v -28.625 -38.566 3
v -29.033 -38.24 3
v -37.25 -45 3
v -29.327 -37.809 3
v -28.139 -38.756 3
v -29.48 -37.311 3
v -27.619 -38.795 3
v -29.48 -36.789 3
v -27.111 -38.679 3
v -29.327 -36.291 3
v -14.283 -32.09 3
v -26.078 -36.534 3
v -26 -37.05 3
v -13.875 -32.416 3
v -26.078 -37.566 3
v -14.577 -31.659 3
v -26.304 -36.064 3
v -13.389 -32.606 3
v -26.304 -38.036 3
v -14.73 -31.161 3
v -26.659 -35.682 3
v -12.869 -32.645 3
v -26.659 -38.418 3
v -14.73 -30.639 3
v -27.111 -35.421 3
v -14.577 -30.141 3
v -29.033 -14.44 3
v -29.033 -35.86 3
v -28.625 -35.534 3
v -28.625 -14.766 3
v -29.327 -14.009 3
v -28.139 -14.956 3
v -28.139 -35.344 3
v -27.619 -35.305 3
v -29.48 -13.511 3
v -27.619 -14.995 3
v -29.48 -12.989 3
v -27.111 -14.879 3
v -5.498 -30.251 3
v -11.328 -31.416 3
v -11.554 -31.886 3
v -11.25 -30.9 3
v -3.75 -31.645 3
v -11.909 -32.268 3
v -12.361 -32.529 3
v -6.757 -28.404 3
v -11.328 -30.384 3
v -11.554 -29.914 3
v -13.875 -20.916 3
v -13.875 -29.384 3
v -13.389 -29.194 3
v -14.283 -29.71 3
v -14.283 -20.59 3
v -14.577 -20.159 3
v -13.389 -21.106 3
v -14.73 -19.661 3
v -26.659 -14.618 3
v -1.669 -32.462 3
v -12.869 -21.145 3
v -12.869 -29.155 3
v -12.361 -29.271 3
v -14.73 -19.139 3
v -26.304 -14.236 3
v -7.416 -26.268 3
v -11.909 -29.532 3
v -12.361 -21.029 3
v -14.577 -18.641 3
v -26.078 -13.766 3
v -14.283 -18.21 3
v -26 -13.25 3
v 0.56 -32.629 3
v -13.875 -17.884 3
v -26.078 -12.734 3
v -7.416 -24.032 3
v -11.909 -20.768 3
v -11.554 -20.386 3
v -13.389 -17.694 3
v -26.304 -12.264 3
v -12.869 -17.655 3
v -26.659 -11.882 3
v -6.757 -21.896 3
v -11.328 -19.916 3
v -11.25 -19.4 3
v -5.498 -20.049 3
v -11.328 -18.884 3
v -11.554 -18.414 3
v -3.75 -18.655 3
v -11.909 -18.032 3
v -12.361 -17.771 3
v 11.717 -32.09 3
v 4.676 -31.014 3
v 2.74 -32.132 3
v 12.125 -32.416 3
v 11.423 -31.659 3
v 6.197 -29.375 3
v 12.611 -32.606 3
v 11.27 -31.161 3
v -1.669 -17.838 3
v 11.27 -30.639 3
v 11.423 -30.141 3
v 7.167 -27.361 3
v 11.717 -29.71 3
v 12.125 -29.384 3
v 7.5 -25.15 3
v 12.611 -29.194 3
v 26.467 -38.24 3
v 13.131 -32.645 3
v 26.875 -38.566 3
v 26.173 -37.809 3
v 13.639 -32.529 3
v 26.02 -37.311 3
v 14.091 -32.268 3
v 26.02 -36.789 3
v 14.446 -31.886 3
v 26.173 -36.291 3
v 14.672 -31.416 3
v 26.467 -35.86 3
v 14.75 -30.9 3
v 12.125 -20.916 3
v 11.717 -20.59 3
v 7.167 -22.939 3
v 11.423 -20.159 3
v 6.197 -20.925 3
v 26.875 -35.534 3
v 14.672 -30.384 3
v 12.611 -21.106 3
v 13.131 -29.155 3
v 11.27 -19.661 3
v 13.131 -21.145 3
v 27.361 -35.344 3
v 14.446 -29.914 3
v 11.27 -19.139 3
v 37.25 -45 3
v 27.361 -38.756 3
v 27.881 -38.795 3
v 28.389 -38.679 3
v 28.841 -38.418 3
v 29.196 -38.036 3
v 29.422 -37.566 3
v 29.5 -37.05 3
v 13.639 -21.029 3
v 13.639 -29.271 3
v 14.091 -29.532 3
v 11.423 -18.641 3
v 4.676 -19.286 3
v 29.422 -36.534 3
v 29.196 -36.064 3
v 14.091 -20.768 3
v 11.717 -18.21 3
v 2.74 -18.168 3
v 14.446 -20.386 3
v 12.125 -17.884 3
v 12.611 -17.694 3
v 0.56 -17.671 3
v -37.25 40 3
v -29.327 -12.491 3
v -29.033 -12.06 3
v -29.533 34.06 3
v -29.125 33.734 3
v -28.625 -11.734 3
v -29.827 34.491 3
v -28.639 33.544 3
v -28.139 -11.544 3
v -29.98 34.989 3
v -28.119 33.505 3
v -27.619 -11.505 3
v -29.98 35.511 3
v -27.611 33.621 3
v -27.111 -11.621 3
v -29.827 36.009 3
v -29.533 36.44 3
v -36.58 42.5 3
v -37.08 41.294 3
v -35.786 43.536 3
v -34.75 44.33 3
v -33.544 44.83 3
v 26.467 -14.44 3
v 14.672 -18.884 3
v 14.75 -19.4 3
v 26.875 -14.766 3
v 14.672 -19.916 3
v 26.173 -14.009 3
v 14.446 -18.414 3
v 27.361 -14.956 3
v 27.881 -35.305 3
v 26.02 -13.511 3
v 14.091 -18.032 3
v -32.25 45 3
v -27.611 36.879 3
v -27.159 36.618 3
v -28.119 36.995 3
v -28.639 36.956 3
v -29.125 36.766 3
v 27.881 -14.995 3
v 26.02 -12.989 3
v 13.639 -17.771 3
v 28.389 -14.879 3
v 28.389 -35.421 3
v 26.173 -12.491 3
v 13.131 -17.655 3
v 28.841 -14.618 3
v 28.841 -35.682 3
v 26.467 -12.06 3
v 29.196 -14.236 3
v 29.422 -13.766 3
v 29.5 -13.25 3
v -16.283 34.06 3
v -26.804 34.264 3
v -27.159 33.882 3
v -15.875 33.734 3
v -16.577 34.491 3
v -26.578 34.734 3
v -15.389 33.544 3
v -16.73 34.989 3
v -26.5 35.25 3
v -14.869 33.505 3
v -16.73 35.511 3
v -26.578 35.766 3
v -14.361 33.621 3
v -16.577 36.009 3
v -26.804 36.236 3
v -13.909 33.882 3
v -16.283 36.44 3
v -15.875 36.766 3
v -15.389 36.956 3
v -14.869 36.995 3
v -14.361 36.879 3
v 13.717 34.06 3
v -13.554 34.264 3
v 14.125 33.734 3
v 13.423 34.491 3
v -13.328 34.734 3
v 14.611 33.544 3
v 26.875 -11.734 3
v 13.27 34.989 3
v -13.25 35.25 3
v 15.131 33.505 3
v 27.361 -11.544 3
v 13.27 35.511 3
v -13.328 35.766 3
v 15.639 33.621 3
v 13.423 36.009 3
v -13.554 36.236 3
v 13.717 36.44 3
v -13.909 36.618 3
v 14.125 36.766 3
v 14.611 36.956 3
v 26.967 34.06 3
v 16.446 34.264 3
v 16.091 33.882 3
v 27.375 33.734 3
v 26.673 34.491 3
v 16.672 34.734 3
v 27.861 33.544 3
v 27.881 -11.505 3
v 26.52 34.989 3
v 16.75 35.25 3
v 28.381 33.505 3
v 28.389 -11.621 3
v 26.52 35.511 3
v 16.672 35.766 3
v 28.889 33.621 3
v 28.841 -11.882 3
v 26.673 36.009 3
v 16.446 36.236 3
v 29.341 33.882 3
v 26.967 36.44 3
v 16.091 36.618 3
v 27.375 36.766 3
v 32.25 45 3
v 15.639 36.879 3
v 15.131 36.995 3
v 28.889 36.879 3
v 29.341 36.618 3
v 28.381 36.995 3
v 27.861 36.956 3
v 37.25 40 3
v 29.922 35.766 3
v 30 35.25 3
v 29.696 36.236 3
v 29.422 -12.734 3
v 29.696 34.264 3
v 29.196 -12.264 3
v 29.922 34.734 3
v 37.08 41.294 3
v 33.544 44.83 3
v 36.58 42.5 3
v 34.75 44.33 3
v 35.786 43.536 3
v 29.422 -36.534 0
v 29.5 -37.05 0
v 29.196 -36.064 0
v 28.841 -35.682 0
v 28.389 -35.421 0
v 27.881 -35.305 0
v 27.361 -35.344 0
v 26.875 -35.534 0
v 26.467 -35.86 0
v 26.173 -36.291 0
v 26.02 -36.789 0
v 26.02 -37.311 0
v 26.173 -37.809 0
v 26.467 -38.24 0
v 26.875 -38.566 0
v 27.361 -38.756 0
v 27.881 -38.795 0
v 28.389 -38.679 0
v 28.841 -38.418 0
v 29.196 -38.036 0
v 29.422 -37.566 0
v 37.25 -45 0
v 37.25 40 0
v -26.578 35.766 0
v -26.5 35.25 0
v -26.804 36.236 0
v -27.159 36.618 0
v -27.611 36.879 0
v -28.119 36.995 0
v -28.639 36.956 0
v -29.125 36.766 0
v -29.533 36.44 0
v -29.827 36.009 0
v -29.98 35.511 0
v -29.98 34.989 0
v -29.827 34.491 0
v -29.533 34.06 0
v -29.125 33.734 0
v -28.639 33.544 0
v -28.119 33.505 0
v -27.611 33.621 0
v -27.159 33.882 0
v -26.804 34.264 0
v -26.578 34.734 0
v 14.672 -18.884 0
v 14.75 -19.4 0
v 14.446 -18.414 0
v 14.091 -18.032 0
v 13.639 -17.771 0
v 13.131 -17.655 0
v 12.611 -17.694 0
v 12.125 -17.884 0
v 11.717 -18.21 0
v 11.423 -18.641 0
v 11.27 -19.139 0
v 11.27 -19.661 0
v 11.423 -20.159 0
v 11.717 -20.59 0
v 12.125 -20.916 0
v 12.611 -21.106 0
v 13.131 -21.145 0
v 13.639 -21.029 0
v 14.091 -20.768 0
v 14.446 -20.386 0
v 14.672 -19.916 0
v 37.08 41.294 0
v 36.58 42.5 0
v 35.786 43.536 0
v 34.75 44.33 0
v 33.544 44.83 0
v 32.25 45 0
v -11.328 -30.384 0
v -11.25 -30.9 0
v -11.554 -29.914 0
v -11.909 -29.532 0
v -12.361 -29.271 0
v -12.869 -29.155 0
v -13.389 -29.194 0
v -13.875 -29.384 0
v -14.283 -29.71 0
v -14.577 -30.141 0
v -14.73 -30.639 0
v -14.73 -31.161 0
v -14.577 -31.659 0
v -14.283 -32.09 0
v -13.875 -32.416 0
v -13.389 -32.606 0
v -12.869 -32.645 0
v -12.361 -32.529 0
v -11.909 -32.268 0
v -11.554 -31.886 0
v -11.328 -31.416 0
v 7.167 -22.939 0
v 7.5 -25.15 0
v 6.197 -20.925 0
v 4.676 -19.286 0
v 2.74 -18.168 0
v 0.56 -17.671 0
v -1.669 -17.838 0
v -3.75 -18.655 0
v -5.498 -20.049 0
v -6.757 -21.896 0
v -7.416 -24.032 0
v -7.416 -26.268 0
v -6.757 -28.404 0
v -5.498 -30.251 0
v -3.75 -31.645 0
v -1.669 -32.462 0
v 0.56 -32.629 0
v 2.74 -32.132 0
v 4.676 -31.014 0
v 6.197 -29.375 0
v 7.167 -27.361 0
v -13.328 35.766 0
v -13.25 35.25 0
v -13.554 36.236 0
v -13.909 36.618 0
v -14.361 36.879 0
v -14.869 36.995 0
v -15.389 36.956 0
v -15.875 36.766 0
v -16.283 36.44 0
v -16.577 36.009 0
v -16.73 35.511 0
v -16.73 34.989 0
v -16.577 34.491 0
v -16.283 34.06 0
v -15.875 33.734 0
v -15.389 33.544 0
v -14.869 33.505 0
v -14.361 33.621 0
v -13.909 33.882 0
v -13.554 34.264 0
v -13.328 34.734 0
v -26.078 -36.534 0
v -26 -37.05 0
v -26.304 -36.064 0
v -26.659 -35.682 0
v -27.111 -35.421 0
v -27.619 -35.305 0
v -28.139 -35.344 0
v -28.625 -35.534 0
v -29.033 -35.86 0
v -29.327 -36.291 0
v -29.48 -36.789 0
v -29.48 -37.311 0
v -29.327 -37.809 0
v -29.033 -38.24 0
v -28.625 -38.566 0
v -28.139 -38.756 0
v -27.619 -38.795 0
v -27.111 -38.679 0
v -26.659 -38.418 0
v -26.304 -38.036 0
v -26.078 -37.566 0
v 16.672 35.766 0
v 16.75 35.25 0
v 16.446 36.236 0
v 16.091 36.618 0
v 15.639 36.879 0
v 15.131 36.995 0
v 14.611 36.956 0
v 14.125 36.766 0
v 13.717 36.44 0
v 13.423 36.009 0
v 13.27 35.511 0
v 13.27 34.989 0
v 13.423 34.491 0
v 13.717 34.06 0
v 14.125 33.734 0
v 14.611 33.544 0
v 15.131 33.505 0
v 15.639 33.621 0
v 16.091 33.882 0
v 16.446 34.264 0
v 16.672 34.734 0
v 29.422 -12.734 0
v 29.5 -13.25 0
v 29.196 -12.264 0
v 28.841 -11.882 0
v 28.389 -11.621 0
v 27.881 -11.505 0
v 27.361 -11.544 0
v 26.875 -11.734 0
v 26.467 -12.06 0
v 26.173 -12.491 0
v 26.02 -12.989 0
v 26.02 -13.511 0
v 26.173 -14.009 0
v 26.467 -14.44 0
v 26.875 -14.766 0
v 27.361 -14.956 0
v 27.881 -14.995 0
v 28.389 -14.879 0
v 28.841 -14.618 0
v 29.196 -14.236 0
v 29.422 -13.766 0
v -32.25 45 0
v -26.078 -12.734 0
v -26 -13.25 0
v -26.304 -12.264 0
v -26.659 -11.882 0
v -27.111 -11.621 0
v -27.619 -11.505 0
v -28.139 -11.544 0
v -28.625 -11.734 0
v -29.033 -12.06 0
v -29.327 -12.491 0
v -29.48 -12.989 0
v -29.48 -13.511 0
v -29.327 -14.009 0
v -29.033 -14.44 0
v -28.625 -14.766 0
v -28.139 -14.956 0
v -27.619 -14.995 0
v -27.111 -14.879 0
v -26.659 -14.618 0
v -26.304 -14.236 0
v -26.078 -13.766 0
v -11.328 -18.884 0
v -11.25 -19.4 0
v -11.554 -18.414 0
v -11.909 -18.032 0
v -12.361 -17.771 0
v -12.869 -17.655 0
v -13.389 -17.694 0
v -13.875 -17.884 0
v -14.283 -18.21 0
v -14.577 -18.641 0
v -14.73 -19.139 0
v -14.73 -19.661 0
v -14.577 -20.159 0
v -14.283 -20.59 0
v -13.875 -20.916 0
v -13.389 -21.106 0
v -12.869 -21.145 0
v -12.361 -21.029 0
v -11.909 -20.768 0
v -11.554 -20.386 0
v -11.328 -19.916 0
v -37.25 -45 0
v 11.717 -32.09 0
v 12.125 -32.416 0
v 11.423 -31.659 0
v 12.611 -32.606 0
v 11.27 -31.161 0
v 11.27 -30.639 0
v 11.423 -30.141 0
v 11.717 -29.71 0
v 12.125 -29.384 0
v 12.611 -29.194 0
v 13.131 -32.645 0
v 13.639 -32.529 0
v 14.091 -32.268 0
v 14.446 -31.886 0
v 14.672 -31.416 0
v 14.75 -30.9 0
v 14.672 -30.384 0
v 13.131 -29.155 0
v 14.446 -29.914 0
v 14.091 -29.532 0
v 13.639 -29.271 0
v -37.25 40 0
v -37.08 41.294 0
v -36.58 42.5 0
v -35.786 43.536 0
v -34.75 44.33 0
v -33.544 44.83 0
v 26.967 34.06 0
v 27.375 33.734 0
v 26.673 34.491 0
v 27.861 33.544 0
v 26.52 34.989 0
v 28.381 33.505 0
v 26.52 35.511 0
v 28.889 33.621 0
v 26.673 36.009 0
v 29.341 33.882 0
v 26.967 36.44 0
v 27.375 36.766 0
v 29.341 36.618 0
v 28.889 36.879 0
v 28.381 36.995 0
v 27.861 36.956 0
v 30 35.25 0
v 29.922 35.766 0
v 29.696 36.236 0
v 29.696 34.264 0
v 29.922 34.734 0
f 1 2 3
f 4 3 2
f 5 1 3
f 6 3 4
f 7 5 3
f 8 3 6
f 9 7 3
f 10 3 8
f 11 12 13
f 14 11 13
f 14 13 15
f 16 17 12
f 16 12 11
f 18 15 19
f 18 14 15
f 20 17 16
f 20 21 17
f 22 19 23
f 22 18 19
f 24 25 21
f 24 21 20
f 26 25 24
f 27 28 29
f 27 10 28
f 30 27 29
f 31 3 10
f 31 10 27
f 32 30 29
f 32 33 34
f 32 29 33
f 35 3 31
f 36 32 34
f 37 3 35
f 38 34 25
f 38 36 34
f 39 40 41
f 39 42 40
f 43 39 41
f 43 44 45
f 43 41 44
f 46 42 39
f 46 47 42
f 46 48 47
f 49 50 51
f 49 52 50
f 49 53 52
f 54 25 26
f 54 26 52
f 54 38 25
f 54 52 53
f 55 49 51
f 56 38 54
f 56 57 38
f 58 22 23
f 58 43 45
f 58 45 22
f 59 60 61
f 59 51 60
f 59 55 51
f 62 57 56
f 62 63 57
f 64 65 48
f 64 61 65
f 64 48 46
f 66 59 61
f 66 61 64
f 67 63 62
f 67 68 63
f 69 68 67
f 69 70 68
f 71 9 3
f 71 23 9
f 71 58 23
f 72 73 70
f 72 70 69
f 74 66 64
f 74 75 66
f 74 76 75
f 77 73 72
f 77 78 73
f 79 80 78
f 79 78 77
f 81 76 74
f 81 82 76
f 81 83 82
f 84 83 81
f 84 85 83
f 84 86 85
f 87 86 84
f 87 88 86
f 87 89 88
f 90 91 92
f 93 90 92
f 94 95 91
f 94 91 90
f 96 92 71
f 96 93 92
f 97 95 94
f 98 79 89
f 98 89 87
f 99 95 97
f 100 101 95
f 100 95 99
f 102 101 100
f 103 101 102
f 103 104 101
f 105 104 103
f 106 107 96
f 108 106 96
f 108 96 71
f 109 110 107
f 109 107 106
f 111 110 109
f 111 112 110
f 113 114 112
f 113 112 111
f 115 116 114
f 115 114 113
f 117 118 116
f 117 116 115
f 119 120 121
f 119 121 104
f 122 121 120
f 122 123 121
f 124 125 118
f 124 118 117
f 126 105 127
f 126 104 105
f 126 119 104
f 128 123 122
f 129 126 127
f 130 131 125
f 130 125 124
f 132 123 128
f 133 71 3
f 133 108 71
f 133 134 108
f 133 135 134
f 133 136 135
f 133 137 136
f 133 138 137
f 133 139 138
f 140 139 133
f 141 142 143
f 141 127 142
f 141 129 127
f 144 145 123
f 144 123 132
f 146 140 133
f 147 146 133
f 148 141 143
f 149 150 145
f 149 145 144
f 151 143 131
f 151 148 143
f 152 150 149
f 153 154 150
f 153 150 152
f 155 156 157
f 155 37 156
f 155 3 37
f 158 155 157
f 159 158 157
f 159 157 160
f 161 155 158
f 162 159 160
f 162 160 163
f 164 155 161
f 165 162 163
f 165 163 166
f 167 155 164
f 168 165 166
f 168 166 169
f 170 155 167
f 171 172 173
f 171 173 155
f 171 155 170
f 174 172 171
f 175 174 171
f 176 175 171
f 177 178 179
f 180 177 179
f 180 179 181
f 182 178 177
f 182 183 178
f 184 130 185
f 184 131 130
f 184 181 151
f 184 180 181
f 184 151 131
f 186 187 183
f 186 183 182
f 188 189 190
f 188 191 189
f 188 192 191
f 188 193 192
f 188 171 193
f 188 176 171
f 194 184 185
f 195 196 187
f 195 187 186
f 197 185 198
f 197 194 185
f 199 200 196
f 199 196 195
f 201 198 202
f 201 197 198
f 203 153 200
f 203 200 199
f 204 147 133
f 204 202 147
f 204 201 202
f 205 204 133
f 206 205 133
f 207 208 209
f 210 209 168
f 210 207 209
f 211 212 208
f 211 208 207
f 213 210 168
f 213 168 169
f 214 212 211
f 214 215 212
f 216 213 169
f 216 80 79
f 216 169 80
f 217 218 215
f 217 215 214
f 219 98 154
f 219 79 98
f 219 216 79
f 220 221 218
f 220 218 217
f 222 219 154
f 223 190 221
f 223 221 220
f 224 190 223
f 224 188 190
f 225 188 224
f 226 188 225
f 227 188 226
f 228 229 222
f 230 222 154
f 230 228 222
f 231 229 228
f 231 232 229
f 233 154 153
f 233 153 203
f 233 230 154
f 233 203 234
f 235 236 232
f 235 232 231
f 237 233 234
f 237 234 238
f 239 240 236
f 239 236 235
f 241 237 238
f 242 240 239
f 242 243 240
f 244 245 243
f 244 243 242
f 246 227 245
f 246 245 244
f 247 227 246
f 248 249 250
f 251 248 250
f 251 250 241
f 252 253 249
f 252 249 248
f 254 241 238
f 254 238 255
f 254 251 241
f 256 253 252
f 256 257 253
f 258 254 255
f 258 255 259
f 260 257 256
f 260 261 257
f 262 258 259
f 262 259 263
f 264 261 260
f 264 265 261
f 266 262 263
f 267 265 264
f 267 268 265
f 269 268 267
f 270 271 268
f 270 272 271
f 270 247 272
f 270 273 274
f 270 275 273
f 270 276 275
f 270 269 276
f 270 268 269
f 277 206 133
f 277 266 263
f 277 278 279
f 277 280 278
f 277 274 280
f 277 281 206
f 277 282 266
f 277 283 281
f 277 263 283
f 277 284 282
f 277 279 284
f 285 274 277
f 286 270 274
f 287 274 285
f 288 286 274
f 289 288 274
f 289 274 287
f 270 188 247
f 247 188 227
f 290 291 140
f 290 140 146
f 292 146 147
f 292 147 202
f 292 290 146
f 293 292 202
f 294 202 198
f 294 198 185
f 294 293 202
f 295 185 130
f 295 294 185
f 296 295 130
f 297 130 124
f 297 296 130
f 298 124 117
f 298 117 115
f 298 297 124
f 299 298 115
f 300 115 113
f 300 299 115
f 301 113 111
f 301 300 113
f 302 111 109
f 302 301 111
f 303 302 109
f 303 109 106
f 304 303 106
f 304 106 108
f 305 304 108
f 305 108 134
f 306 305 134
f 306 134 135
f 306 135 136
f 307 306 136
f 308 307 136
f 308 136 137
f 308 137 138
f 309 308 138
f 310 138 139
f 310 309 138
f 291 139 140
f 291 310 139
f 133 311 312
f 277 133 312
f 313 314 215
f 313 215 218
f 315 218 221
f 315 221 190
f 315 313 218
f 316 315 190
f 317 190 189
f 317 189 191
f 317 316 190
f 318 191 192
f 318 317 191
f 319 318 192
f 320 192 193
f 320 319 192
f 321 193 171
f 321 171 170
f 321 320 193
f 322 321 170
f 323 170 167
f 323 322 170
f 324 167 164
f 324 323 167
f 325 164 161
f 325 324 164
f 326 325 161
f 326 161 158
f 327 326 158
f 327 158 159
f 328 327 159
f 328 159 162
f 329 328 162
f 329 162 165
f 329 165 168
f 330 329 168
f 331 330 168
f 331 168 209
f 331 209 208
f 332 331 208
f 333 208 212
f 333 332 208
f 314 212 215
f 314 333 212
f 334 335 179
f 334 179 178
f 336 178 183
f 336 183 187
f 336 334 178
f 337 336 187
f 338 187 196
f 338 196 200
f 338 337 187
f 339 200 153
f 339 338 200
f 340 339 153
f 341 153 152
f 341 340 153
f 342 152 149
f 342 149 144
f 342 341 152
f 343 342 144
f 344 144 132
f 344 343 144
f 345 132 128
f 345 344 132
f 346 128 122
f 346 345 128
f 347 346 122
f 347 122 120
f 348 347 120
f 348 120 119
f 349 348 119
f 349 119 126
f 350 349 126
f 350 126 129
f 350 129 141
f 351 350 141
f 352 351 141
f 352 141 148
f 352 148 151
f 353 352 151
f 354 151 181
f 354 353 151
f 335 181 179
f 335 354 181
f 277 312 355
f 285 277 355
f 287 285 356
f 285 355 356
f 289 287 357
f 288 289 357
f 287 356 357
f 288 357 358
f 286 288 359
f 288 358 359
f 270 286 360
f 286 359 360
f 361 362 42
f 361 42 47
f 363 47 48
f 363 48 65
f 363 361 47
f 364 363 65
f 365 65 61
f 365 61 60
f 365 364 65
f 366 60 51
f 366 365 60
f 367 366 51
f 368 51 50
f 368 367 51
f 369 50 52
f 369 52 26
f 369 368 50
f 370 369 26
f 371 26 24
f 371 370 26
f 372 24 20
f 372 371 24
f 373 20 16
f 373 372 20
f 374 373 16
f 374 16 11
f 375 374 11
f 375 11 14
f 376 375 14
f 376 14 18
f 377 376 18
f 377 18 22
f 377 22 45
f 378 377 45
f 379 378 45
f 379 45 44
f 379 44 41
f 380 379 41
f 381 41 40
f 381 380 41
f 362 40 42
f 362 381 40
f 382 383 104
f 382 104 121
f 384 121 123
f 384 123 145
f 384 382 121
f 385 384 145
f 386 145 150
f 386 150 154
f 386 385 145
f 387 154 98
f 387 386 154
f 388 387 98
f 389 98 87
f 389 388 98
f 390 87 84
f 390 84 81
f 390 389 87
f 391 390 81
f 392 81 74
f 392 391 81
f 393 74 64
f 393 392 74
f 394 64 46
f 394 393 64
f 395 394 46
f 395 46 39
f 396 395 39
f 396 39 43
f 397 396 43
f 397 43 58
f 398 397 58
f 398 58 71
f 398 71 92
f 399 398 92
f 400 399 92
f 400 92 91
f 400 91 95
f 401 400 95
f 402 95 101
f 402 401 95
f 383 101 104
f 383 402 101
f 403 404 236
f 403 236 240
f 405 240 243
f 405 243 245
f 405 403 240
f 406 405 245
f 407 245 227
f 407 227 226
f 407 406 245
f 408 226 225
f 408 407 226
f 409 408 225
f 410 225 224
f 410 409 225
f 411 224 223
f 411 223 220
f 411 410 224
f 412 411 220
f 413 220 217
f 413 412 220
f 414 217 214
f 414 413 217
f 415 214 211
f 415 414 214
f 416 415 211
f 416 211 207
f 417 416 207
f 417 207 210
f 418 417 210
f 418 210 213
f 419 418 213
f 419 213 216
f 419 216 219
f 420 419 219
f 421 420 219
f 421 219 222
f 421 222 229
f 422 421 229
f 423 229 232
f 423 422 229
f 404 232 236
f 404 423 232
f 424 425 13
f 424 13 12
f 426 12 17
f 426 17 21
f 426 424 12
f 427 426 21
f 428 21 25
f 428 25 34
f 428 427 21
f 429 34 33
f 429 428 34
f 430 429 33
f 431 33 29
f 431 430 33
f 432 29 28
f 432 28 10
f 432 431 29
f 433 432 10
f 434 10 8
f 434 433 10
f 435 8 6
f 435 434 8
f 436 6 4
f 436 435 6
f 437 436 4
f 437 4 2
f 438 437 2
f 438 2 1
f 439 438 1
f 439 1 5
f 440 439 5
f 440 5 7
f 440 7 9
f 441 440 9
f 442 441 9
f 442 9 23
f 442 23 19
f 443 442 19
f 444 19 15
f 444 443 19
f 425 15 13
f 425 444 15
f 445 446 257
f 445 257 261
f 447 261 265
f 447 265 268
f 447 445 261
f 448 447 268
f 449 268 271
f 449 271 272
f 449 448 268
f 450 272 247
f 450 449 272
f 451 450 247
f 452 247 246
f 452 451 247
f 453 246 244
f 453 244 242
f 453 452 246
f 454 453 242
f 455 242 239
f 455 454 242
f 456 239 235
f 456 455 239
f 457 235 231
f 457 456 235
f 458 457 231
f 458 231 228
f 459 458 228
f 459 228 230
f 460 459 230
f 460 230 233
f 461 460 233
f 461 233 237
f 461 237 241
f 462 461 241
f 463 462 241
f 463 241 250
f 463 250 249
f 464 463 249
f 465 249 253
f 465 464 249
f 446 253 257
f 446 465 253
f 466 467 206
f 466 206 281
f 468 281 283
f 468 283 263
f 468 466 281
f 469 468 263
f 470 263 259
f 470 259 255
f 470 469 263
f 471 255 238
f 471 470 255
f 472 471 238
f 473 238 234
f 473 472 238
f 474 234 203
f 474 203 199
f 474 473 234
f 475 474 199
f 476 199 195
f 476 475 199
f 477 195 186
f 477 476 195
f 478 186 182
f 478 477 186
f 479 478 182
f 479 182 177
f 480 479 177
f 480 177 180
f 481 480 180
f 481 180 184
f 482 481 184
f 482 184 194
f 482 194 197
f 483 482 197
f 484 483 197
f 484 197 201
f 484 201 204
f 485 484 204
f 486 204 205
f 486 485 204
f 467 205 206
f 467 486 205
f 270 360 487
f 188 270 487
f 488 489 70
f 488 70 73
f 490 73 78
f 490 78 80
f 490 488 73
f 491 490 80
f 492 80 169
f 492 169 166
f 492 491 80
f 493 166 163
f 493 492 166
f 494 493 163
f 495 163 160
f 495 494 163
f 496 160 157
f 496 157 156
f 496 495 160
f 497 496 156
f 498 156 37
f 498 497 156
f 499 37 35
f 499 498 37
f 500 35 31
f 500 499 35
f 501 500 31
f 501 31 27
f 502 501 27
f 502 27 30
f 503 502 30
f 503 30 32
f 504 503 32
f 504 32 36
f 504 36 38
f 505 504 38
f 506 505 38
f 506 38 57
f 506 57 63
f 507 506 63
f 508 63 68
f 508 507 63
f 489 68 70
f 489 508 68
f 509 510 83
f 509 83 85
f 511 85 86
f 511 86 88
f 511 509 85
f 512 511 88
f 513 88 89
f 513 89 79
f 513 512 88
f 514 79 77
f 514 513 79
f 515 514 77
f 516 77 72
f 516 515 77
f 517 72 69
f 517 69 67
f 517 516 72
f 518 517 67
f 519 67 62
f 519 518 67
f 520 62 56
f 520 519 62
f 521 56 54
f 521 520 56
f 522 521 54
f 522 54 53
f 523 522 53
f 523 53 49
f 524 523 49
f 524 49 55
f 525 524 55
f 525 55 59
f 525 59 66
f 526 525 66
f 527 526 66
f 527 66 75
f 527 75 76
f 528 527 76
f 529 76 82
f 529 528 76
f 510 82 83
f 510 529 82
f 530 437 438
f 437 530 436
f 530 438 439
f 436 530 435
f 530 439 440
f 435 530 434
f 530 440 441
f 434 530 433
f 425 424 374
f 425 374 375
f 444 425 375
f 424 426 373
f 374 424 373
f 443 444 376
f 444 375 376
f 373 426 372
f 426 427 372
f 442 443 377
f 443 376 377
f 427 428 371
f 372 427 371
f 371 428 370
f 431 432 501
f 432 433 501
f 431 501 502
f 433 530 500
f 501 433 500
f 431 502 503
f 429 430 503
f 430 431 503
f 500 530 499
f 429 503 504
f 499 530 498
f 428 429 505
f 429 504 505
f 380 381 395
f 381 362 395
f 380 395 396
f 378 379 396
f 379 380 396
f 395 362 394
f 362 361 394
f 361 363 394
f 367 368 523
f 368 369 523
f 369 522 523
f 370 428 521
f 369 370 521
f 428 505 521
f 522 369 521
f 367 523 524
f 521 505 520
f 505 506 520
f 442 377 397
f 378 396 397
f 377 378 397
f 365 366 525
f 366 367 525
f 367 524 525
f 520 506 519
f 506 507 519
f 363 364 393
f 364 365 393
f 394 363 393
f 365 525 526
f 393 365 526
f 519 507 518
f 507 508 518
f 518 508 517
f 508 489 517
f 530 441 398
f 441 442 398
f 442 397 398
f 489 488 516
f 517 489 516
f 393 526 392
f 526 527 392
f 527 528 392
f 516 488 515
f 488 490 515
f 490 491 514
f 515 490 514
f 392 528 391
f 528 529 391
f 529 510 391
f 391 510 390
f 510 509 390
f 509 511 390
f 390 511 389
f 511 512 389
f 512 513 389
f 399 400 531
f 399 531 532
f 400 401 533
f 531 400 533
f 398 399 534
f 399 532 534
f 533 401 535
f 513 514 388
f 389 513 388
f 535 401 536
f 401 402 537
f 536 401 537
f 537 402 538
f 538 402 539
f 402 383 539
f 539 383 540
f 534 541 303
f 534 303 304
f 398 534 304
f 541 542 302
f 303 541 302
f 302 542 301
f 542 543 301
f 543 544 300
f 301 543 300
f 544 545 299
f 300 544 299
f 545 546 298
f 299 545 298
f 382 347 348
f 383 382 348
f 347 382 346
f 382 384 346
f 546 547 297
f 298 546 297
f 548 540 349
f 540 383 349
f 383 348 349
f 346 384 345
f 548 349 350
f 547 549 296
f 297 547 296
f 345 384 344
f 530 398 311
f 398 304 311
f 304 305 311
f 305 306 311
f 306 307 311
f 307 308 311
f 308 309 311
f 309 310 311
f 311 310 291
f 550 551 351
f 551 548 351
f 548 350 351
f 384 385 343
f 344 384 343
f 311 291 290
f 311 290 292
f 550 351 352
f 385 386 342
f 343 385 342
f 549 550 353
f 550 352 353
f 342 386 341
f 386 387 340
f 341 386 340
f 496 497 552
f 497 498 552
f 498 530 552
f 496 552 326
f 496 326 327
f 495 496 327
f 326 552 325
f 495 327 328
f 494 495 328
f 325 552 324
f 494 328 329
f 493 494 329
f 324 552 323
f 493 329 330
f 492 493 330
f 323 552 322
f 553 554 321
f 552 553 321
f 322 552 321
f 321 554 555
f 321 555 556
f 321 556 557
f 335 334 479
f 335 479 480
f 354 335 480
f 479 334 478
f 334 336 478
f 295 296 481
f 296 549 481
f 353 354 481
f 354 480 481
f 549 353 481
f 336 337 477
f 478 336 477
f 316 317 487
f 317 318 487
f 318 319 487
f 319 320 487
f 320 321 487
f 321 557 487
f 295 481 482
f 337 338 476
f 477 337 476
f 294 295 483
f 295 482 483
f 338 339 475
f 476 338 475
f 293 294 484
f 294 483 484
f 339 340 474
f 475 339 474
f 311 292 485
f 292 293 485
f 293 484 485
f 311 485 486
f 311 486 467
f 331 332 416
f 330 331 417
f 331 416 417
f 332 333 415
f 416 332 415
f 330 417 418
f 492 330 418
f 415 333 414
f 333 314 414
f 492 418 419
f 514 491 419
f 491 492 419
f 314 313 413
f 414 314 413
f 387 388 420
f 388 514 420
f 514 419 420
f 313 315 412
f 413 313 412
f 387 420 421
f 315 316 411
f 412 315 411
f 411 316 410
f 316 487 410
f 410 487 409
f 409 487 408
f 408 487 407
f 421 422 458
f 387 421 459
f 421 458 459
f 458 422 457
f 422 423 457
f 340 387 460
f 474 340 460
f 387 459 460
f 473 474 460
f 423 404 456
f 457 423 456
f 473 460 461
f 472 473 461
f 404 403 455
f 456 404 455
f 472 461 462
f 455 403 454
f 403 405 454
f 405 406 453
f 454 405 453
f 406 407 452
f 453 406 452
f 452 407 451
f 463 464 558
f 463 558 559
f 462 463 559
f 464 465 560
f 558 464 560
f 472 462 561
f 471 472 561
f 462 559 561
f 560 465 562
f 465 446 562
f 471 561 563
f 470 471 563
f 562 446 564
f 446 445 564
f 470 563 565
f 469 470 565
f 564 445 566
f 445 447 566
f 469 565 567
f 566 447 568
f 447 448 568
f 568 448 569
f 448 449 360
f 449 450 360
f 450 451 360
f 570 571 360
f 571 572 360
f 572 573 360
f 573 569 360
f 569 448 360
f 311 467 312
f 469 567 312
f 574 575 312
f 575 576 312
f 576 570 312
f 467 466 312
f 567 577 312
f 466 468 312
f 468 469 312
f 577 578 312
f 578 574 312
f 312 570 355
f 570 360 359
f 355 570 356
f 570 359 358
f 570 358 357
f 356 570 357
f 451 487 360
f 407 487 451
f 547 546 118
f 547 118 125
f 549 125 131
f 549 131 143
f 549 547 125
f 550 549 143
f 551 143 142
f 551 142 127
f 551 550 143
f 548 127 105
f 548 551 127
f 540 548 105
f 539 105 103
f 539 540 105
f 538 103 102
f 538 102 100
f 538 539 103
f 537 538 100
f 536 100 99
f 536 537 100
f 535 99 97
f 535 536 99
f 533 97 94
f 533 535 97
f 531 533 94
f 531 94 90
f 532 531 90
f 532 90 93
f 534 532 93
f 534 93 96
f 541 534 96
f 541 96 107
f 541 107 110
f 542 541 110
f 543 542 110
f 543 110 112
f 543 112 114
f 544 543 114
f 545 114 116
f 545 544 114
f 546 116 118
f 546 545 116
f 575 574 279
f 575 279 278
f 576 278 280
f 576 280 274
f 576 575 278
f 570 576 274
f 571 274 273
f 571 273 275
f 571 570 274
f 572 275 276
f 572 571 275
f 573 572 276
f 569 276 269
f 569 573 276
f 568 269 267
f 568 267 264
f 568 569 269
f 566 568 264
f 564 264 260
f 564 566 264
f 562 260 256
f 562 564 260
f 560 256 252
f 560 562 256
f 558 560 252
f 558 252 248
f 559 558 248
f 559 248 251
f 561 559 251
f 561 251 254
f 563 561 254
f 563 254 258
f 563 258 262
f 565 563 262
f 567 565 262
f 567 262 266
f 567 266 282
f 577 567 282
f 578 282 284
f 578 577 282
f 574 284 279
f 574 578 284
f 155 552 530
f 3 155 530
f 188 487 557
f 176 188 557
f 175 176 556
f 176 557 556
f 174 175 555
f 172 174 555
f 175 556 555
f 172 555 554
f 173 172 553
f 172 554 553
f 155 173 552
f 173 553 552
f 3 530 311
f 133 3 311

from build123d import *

# Parameters (mm, degrees)
F0_R     = 1.75
F0_R_2   = 7.5
F1_DEPTH = 3


with BuildPart() as f1:
    # F0 (on Top) → F1 (new body)
    with BuildSketch(Plane.XY):
        with BuildLine():
            Line((-37.25, -45), (37.25, -45))
            Line((37.25, -45), (37.25, 40))
            ThreePointArc((37.25, 40), (35.785534, 43.535534), (32.25, 45))
            Line((32.25, 45), (-32.25, 45))
            ThreePointArc((-32.25, 45), (-35.785534, 43.535534), (-37.25, 40))
            Line((-37.25, 40), (-37.25, -45))
        make_face()
        with Locations((-27.75, -37.05)):
            Circle(F0_R, mode=Mode.SUBTRACT)
        with Locations((-13, -30.9)):
            Circle(F0_R, mode=Mode.SUBTRACT)
        with Locations((-27.75, -13.25)):
            Circle(F0_R, mode=Mode.SUBTRACT)
        with Locations((-13, -19.4)):
            Circle(F0_R, mode=Mode.SUBTRACT)
        with Locations((0, -25.15)):
            Circle(F0_R_2, mode=Mode.SUBTRACT)
        with Locations((13, -30.9)):
            Circle(F0_R, mode=Mode.SUBTRACT)
        with Locations((27.75, -37.05)):
            Circle(F0_R, mode=Mode.SUBTRACT)
        with Locations((13, -19.4)):
            Circle(F0_R, mode=Mode.SUBTRACT)
        with Locations((27.75, -13.25)):
            Circle(F0_R, mode=Mode.SUBTRACT)
        with Locations((-28.25, 35.25)):
            Circle(F0_R, mode=Mode.SUBTRACT)
        with Locations((-15, 35.25)):
            Circle(F0_R, mode=Mode.SUBTRACT)
        with Locations((15, 35.25)):
            Circle(F0_R, mode=Mode.SUBTRACT)
        with Locations((28.25, 35.25)):
            Circle(F0_R, mode=Mode.SUBTRACT)
    extrude(amount=F1_DEPTH)


solid = f1.part
